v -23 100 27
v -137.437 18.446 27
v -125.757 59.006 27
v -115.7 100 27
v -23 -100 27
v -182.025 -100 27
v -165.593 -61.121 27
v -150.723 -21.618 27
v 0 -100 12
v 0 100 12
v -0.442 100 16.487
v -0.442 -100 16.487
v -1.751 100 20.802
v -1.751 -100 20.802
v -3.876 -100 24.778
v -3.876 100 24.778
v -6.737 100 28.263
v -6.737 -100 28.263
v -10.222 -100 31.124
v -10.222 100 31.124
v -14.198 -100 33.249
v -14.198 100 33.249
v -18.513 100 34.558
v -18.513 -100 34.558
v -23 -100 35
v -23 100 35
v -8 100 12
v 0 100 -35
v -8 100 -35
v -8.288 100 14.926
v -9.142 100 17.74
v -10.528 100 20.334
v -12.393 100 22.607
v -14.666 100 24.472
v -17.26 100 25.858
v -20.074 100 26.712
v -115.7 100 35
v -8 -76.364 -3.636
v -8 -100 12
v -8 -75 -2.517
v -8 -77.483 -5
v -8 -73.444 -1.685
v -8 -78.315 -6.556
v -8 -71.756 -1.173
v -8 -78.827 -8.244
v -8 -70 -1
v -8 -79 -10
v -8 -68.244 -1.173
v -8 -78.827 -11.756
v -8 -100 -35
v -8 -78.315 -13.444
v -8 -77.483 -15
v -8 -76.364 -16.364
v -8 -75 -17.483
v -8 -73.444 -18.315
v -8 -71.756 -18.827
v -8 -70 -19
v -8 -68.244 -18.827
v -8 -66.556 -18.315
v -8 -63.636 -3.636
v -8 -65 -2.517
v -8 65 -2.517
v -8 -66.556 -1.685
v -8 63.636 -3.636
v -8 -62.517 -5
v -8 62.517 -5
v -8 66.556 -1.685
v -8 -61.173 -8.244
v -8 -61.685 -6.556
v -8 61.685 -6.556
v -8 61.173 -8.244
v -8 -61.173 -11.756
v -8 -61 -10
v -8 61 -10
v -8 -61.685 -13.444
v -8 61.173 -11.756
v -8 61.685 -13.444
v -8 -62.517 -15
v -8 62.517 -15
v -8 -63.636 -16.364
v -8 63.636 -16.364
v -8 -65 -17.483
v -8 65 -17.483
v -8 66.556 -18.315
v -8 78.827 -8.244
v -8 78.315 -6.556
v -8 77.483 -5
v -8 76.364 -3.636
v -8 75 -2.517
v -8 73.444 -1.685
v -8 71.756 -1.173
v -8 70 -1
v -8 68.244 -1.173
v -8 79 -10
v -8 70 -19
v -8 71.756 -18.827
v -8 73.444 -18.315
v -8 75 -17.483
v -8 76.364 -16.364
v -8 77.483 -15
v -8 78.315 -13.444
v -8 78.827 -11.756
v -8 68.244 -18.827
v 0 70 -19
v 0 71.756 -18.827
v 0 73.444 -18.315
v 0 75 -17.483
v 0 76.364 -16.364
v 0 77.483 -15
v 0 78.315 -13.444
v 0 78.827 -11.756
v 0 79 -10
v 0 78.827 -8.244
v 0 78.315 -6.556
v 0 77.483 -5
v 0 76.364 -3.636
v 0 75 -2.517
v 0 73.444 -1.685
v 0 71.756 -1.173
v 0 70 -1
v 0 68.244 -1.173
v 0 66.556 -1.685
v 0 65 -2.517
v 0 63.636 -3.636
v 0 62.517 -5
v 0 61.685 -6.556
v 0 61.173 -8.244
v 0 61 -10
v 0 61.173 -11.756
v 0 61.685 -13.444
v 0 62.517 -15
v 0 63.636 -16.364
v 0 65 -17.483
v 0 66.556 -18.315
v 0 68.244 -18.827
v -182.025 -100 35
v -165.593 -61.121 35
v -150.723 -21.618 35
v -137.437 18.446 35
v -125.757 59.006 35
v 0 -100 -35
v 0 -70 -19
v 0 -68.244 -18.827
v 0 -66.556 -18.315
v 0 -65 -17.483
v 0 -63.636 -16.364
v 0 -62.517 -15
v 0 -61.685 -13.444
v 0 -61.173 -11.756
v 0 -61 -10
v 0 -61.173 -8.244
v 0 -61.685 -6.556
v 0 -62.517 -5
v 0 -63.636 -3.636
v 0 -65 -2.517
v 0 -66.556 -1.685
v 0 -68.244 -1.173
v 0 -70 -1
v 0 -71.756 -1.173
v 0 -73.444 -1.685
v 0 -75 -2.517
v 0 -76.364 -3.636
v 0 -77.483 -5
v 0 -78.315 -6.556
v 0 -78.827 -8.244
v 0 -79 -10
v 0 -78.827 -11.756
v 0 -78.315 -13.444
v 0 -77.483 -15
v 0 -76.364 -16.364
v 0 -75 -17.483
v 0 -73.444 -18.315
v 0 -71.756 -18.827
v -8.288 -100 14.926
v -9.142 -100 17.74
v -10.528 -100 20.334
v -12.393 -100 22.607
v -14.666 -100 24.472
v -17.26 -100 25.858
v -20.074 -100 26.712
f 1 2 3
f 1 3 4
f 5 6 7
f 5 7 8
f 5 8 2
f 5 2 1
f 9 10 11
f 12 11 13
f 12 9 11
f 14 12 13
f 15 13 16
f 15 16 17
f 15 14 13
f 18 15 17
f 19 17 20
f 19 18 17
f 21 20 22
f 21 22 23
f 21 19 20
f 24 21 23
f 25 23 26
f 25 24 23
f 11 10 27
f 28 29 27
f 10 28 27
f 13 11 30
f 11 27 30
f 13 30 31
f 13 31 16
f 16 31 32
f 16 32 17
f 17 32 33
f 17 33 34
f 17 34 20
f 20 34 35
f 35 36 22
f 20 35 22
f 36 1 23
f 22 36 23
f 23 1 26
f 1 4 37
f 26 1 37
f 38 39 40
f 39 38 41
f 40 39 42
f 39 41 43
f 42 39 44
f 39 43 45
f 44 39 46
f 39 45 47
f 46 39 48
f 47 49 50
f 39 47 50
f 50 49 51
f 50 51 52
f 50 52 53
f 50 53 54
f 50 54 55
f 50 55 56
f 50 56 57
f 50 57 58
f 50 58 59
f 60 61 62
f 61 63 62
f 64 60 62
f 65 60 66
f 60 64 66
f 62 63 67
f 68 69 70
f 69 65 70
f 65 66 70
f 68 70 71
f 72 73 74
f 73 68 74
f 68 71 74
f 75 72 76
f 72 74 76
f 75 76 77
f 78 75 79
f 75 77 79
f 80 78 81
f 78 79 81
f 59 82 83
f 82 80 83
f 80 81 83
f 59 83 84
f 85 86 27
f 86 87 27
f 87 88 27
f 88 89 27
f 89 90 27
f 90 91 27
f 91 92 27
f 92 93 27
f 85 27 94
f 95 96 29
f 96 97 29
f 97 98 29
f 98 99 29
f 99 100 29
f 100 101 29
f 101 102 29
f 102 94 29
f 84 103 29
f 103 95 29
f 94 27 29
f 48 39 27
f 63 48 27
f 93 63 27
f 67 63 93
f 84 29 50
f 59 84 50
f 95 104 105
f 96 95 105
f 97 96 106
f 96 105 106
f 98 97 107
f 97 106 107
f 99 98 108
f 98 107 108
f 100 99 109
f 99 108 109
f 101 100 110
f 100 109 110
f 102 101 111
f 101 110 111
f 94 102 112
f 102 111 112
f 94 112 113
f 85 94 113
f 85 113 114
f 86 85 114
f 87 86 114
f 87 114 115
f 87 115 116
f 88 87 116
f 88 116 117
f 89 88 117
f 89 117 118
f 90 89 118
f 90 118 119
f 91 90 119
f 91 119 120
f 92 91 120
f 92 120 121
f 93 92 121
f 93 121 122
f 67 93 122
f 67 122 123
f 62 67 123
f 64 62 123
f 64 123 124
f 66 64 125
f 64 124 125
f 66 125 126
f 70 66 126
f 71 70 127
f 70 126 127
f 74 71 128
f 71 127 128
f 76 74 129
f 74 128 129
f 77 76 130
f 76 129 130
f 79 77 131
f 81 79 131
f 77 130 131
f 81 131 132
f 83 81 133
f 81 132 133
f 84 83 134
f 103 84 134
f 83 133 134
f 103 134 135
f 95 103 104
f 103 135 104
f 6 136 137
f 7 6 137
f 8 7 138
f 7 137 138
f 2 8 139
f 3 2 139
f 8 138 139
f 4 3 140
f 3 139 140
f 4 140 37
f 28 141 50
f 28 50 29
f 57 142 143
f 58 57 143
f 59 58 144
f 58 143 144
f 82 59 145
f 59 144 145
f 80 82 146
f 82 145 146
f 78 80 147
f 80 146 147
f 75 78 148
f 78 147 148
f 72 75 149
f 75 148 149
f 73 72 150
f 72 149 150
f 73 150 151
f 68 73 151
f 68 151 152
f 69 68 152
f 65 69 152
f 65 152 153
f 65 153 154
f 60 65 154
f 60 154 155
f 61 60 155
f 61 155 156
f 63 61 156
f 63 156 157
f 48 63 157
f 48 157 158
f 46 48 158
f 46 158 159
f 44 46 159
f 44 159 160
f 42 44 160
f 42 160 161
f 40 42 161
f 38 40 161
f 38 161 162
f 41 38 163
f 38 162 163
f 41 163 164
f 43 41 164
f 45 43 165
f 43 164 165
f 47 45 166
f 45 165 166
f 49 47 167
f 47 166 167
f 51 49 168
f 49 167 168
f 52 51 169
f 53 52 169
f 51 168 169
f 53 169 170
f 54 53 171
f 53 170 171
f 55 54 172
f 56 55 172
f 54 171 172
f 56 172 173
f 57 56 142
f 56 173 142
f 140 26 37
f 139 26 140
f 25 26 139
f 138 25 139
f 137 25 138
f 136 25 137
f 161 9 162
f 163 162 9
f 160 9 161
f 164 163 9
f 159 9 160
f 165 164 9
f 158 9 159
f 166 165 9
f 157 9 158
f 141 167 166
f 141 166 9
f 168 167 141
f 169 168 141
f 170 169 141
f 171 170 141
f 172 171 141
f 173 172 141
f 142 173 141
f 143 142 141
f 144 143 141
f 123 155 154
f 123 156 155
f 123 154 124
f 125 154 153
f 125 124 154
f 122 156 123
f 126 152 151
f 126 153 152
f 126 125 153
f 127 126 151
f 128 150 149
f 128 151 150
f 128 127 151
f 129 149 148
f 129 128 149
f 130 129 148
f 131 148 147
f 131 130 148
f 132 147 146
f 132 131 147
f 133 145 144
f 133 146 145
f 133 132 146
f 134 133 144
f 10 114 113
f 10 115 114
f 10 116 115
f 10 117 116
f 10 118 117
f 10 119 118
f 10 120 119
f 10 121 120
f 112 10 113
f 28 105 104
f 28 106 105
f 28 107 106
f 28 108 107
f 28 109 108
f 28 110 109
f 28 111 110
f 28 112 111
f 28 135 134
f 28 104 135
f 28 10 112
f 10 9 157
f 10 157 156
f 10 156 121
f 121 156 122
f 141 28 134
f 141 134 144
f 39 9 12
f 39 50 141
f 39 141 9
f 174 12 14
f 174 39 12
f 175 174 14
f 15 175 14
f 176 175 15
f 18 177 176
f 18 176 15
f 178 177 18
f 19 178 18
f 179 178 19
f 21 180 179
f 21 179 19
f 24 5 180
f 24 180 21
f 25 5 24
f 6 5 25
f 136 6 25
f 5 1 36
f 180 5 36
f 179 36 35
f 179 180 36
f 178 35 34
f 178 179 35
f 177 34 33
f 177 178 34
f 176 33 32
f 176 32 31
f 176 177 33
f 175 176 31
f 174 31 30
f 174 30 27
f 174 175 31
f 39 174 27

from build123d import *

# Parameters (mm, degrees)
SKETCH1_W                    = 70
SKETCH1_H                    = 200
BASE_FLANGE1_DEPTH           = 8
EDGE_FLANGE1_STRIP_W         = 62
EDGE_FLANGE1_STRIP_H         = 8
EDGE_FLANGE1_STRIP_CUT_DEPTH = 200
EDGE_FLANGE1_DEPTH           = 200
SKETCH9_R                    = 1060
CUT_EXTRUDE1_DEPTH           = 10
SKETCH10_R                   = 9
CUT_EXTRUDE2_DEPTH           = 10


# Sheet-metal steps are written as plain solids
with BuildPart() as part:
    # Sketch1 → Base-Flange1 (new body)
    with BuildSketch(Plane(origin=(0, 0, 0), x_dir=(0, 0, -1), z_dir=(1, 0, 0))):
        Rectangle(SKETCH1_W, SKETCH1_H)
    extrude(amount=-BASE_FLANGE1_DEPTH)

    # Edge-Flange1 strip (across the edge) → Edge-Flange1 strip cut (cut)
    with BuildSketch(Plane(origin=(-8, -100, 35), x_dir=(0, 0, -1), z_dir=(0, 1, 0))):
        with Locations((-8, -4)):
            Rectangle(EDGE_FLANGE1_STRIP_W, EDGE_FLANGE1_STRIP_H)
    extrude(amount=EDGE_FLANGE1_STRIP_CUT_DEPTH, mode=Mode.SUBTRACT)

    # Edge-Flange1 section (across the edge) → Edge-Flange1 (add)
    with BuildSketch(Plane(origin=(-8, -100, 35), x_dir=(0, 0, -1), z_dir=(0, 1, 0))):
        with BuildLine():
            Line((0, 15), (0, 242))
            Line((0, 242), (8, 242))
            Line((8, 242), (8, 15))
            ThreePointArc((8, 15), (12.393398282, 4.393398282), (23, 0))
            Line((23, 0), (23, -8))
            ThreePointArc((23, -8), (6.736544033, -1.263455967), (0, 15))
        make_face()
    extrude(amount=EDGE_FLANGE1_DEPTH)

    # Sketch9 → Cut-Extrude1 (cut)
    with BuildSketch(Plane.XY.offset(35)):
        with Locations((-1150, 332)):
            Circle(SKETCH9_R)
    extrude(amount=-CUT_EXTRUDE1_DEPTH, mode=Mode.SUBTRACT)

    # Sketch10 → Cut-Extrude2 (cut)
    with BuildSketch(Plane(origin=(0, 0, 0), x_dir=(0, 0, -1), z_dir=(1, 0, 0))):
        with Locations((10, -70)):
            Circle(SKETCH10_R)
        with Locations((10, 70)):
            Circle(SKETCH10_R)
    extrude(amount=-CUT_EXTRUDE2_DEPTH, mode=Mode.SUBTRACT)


solid = part.part
